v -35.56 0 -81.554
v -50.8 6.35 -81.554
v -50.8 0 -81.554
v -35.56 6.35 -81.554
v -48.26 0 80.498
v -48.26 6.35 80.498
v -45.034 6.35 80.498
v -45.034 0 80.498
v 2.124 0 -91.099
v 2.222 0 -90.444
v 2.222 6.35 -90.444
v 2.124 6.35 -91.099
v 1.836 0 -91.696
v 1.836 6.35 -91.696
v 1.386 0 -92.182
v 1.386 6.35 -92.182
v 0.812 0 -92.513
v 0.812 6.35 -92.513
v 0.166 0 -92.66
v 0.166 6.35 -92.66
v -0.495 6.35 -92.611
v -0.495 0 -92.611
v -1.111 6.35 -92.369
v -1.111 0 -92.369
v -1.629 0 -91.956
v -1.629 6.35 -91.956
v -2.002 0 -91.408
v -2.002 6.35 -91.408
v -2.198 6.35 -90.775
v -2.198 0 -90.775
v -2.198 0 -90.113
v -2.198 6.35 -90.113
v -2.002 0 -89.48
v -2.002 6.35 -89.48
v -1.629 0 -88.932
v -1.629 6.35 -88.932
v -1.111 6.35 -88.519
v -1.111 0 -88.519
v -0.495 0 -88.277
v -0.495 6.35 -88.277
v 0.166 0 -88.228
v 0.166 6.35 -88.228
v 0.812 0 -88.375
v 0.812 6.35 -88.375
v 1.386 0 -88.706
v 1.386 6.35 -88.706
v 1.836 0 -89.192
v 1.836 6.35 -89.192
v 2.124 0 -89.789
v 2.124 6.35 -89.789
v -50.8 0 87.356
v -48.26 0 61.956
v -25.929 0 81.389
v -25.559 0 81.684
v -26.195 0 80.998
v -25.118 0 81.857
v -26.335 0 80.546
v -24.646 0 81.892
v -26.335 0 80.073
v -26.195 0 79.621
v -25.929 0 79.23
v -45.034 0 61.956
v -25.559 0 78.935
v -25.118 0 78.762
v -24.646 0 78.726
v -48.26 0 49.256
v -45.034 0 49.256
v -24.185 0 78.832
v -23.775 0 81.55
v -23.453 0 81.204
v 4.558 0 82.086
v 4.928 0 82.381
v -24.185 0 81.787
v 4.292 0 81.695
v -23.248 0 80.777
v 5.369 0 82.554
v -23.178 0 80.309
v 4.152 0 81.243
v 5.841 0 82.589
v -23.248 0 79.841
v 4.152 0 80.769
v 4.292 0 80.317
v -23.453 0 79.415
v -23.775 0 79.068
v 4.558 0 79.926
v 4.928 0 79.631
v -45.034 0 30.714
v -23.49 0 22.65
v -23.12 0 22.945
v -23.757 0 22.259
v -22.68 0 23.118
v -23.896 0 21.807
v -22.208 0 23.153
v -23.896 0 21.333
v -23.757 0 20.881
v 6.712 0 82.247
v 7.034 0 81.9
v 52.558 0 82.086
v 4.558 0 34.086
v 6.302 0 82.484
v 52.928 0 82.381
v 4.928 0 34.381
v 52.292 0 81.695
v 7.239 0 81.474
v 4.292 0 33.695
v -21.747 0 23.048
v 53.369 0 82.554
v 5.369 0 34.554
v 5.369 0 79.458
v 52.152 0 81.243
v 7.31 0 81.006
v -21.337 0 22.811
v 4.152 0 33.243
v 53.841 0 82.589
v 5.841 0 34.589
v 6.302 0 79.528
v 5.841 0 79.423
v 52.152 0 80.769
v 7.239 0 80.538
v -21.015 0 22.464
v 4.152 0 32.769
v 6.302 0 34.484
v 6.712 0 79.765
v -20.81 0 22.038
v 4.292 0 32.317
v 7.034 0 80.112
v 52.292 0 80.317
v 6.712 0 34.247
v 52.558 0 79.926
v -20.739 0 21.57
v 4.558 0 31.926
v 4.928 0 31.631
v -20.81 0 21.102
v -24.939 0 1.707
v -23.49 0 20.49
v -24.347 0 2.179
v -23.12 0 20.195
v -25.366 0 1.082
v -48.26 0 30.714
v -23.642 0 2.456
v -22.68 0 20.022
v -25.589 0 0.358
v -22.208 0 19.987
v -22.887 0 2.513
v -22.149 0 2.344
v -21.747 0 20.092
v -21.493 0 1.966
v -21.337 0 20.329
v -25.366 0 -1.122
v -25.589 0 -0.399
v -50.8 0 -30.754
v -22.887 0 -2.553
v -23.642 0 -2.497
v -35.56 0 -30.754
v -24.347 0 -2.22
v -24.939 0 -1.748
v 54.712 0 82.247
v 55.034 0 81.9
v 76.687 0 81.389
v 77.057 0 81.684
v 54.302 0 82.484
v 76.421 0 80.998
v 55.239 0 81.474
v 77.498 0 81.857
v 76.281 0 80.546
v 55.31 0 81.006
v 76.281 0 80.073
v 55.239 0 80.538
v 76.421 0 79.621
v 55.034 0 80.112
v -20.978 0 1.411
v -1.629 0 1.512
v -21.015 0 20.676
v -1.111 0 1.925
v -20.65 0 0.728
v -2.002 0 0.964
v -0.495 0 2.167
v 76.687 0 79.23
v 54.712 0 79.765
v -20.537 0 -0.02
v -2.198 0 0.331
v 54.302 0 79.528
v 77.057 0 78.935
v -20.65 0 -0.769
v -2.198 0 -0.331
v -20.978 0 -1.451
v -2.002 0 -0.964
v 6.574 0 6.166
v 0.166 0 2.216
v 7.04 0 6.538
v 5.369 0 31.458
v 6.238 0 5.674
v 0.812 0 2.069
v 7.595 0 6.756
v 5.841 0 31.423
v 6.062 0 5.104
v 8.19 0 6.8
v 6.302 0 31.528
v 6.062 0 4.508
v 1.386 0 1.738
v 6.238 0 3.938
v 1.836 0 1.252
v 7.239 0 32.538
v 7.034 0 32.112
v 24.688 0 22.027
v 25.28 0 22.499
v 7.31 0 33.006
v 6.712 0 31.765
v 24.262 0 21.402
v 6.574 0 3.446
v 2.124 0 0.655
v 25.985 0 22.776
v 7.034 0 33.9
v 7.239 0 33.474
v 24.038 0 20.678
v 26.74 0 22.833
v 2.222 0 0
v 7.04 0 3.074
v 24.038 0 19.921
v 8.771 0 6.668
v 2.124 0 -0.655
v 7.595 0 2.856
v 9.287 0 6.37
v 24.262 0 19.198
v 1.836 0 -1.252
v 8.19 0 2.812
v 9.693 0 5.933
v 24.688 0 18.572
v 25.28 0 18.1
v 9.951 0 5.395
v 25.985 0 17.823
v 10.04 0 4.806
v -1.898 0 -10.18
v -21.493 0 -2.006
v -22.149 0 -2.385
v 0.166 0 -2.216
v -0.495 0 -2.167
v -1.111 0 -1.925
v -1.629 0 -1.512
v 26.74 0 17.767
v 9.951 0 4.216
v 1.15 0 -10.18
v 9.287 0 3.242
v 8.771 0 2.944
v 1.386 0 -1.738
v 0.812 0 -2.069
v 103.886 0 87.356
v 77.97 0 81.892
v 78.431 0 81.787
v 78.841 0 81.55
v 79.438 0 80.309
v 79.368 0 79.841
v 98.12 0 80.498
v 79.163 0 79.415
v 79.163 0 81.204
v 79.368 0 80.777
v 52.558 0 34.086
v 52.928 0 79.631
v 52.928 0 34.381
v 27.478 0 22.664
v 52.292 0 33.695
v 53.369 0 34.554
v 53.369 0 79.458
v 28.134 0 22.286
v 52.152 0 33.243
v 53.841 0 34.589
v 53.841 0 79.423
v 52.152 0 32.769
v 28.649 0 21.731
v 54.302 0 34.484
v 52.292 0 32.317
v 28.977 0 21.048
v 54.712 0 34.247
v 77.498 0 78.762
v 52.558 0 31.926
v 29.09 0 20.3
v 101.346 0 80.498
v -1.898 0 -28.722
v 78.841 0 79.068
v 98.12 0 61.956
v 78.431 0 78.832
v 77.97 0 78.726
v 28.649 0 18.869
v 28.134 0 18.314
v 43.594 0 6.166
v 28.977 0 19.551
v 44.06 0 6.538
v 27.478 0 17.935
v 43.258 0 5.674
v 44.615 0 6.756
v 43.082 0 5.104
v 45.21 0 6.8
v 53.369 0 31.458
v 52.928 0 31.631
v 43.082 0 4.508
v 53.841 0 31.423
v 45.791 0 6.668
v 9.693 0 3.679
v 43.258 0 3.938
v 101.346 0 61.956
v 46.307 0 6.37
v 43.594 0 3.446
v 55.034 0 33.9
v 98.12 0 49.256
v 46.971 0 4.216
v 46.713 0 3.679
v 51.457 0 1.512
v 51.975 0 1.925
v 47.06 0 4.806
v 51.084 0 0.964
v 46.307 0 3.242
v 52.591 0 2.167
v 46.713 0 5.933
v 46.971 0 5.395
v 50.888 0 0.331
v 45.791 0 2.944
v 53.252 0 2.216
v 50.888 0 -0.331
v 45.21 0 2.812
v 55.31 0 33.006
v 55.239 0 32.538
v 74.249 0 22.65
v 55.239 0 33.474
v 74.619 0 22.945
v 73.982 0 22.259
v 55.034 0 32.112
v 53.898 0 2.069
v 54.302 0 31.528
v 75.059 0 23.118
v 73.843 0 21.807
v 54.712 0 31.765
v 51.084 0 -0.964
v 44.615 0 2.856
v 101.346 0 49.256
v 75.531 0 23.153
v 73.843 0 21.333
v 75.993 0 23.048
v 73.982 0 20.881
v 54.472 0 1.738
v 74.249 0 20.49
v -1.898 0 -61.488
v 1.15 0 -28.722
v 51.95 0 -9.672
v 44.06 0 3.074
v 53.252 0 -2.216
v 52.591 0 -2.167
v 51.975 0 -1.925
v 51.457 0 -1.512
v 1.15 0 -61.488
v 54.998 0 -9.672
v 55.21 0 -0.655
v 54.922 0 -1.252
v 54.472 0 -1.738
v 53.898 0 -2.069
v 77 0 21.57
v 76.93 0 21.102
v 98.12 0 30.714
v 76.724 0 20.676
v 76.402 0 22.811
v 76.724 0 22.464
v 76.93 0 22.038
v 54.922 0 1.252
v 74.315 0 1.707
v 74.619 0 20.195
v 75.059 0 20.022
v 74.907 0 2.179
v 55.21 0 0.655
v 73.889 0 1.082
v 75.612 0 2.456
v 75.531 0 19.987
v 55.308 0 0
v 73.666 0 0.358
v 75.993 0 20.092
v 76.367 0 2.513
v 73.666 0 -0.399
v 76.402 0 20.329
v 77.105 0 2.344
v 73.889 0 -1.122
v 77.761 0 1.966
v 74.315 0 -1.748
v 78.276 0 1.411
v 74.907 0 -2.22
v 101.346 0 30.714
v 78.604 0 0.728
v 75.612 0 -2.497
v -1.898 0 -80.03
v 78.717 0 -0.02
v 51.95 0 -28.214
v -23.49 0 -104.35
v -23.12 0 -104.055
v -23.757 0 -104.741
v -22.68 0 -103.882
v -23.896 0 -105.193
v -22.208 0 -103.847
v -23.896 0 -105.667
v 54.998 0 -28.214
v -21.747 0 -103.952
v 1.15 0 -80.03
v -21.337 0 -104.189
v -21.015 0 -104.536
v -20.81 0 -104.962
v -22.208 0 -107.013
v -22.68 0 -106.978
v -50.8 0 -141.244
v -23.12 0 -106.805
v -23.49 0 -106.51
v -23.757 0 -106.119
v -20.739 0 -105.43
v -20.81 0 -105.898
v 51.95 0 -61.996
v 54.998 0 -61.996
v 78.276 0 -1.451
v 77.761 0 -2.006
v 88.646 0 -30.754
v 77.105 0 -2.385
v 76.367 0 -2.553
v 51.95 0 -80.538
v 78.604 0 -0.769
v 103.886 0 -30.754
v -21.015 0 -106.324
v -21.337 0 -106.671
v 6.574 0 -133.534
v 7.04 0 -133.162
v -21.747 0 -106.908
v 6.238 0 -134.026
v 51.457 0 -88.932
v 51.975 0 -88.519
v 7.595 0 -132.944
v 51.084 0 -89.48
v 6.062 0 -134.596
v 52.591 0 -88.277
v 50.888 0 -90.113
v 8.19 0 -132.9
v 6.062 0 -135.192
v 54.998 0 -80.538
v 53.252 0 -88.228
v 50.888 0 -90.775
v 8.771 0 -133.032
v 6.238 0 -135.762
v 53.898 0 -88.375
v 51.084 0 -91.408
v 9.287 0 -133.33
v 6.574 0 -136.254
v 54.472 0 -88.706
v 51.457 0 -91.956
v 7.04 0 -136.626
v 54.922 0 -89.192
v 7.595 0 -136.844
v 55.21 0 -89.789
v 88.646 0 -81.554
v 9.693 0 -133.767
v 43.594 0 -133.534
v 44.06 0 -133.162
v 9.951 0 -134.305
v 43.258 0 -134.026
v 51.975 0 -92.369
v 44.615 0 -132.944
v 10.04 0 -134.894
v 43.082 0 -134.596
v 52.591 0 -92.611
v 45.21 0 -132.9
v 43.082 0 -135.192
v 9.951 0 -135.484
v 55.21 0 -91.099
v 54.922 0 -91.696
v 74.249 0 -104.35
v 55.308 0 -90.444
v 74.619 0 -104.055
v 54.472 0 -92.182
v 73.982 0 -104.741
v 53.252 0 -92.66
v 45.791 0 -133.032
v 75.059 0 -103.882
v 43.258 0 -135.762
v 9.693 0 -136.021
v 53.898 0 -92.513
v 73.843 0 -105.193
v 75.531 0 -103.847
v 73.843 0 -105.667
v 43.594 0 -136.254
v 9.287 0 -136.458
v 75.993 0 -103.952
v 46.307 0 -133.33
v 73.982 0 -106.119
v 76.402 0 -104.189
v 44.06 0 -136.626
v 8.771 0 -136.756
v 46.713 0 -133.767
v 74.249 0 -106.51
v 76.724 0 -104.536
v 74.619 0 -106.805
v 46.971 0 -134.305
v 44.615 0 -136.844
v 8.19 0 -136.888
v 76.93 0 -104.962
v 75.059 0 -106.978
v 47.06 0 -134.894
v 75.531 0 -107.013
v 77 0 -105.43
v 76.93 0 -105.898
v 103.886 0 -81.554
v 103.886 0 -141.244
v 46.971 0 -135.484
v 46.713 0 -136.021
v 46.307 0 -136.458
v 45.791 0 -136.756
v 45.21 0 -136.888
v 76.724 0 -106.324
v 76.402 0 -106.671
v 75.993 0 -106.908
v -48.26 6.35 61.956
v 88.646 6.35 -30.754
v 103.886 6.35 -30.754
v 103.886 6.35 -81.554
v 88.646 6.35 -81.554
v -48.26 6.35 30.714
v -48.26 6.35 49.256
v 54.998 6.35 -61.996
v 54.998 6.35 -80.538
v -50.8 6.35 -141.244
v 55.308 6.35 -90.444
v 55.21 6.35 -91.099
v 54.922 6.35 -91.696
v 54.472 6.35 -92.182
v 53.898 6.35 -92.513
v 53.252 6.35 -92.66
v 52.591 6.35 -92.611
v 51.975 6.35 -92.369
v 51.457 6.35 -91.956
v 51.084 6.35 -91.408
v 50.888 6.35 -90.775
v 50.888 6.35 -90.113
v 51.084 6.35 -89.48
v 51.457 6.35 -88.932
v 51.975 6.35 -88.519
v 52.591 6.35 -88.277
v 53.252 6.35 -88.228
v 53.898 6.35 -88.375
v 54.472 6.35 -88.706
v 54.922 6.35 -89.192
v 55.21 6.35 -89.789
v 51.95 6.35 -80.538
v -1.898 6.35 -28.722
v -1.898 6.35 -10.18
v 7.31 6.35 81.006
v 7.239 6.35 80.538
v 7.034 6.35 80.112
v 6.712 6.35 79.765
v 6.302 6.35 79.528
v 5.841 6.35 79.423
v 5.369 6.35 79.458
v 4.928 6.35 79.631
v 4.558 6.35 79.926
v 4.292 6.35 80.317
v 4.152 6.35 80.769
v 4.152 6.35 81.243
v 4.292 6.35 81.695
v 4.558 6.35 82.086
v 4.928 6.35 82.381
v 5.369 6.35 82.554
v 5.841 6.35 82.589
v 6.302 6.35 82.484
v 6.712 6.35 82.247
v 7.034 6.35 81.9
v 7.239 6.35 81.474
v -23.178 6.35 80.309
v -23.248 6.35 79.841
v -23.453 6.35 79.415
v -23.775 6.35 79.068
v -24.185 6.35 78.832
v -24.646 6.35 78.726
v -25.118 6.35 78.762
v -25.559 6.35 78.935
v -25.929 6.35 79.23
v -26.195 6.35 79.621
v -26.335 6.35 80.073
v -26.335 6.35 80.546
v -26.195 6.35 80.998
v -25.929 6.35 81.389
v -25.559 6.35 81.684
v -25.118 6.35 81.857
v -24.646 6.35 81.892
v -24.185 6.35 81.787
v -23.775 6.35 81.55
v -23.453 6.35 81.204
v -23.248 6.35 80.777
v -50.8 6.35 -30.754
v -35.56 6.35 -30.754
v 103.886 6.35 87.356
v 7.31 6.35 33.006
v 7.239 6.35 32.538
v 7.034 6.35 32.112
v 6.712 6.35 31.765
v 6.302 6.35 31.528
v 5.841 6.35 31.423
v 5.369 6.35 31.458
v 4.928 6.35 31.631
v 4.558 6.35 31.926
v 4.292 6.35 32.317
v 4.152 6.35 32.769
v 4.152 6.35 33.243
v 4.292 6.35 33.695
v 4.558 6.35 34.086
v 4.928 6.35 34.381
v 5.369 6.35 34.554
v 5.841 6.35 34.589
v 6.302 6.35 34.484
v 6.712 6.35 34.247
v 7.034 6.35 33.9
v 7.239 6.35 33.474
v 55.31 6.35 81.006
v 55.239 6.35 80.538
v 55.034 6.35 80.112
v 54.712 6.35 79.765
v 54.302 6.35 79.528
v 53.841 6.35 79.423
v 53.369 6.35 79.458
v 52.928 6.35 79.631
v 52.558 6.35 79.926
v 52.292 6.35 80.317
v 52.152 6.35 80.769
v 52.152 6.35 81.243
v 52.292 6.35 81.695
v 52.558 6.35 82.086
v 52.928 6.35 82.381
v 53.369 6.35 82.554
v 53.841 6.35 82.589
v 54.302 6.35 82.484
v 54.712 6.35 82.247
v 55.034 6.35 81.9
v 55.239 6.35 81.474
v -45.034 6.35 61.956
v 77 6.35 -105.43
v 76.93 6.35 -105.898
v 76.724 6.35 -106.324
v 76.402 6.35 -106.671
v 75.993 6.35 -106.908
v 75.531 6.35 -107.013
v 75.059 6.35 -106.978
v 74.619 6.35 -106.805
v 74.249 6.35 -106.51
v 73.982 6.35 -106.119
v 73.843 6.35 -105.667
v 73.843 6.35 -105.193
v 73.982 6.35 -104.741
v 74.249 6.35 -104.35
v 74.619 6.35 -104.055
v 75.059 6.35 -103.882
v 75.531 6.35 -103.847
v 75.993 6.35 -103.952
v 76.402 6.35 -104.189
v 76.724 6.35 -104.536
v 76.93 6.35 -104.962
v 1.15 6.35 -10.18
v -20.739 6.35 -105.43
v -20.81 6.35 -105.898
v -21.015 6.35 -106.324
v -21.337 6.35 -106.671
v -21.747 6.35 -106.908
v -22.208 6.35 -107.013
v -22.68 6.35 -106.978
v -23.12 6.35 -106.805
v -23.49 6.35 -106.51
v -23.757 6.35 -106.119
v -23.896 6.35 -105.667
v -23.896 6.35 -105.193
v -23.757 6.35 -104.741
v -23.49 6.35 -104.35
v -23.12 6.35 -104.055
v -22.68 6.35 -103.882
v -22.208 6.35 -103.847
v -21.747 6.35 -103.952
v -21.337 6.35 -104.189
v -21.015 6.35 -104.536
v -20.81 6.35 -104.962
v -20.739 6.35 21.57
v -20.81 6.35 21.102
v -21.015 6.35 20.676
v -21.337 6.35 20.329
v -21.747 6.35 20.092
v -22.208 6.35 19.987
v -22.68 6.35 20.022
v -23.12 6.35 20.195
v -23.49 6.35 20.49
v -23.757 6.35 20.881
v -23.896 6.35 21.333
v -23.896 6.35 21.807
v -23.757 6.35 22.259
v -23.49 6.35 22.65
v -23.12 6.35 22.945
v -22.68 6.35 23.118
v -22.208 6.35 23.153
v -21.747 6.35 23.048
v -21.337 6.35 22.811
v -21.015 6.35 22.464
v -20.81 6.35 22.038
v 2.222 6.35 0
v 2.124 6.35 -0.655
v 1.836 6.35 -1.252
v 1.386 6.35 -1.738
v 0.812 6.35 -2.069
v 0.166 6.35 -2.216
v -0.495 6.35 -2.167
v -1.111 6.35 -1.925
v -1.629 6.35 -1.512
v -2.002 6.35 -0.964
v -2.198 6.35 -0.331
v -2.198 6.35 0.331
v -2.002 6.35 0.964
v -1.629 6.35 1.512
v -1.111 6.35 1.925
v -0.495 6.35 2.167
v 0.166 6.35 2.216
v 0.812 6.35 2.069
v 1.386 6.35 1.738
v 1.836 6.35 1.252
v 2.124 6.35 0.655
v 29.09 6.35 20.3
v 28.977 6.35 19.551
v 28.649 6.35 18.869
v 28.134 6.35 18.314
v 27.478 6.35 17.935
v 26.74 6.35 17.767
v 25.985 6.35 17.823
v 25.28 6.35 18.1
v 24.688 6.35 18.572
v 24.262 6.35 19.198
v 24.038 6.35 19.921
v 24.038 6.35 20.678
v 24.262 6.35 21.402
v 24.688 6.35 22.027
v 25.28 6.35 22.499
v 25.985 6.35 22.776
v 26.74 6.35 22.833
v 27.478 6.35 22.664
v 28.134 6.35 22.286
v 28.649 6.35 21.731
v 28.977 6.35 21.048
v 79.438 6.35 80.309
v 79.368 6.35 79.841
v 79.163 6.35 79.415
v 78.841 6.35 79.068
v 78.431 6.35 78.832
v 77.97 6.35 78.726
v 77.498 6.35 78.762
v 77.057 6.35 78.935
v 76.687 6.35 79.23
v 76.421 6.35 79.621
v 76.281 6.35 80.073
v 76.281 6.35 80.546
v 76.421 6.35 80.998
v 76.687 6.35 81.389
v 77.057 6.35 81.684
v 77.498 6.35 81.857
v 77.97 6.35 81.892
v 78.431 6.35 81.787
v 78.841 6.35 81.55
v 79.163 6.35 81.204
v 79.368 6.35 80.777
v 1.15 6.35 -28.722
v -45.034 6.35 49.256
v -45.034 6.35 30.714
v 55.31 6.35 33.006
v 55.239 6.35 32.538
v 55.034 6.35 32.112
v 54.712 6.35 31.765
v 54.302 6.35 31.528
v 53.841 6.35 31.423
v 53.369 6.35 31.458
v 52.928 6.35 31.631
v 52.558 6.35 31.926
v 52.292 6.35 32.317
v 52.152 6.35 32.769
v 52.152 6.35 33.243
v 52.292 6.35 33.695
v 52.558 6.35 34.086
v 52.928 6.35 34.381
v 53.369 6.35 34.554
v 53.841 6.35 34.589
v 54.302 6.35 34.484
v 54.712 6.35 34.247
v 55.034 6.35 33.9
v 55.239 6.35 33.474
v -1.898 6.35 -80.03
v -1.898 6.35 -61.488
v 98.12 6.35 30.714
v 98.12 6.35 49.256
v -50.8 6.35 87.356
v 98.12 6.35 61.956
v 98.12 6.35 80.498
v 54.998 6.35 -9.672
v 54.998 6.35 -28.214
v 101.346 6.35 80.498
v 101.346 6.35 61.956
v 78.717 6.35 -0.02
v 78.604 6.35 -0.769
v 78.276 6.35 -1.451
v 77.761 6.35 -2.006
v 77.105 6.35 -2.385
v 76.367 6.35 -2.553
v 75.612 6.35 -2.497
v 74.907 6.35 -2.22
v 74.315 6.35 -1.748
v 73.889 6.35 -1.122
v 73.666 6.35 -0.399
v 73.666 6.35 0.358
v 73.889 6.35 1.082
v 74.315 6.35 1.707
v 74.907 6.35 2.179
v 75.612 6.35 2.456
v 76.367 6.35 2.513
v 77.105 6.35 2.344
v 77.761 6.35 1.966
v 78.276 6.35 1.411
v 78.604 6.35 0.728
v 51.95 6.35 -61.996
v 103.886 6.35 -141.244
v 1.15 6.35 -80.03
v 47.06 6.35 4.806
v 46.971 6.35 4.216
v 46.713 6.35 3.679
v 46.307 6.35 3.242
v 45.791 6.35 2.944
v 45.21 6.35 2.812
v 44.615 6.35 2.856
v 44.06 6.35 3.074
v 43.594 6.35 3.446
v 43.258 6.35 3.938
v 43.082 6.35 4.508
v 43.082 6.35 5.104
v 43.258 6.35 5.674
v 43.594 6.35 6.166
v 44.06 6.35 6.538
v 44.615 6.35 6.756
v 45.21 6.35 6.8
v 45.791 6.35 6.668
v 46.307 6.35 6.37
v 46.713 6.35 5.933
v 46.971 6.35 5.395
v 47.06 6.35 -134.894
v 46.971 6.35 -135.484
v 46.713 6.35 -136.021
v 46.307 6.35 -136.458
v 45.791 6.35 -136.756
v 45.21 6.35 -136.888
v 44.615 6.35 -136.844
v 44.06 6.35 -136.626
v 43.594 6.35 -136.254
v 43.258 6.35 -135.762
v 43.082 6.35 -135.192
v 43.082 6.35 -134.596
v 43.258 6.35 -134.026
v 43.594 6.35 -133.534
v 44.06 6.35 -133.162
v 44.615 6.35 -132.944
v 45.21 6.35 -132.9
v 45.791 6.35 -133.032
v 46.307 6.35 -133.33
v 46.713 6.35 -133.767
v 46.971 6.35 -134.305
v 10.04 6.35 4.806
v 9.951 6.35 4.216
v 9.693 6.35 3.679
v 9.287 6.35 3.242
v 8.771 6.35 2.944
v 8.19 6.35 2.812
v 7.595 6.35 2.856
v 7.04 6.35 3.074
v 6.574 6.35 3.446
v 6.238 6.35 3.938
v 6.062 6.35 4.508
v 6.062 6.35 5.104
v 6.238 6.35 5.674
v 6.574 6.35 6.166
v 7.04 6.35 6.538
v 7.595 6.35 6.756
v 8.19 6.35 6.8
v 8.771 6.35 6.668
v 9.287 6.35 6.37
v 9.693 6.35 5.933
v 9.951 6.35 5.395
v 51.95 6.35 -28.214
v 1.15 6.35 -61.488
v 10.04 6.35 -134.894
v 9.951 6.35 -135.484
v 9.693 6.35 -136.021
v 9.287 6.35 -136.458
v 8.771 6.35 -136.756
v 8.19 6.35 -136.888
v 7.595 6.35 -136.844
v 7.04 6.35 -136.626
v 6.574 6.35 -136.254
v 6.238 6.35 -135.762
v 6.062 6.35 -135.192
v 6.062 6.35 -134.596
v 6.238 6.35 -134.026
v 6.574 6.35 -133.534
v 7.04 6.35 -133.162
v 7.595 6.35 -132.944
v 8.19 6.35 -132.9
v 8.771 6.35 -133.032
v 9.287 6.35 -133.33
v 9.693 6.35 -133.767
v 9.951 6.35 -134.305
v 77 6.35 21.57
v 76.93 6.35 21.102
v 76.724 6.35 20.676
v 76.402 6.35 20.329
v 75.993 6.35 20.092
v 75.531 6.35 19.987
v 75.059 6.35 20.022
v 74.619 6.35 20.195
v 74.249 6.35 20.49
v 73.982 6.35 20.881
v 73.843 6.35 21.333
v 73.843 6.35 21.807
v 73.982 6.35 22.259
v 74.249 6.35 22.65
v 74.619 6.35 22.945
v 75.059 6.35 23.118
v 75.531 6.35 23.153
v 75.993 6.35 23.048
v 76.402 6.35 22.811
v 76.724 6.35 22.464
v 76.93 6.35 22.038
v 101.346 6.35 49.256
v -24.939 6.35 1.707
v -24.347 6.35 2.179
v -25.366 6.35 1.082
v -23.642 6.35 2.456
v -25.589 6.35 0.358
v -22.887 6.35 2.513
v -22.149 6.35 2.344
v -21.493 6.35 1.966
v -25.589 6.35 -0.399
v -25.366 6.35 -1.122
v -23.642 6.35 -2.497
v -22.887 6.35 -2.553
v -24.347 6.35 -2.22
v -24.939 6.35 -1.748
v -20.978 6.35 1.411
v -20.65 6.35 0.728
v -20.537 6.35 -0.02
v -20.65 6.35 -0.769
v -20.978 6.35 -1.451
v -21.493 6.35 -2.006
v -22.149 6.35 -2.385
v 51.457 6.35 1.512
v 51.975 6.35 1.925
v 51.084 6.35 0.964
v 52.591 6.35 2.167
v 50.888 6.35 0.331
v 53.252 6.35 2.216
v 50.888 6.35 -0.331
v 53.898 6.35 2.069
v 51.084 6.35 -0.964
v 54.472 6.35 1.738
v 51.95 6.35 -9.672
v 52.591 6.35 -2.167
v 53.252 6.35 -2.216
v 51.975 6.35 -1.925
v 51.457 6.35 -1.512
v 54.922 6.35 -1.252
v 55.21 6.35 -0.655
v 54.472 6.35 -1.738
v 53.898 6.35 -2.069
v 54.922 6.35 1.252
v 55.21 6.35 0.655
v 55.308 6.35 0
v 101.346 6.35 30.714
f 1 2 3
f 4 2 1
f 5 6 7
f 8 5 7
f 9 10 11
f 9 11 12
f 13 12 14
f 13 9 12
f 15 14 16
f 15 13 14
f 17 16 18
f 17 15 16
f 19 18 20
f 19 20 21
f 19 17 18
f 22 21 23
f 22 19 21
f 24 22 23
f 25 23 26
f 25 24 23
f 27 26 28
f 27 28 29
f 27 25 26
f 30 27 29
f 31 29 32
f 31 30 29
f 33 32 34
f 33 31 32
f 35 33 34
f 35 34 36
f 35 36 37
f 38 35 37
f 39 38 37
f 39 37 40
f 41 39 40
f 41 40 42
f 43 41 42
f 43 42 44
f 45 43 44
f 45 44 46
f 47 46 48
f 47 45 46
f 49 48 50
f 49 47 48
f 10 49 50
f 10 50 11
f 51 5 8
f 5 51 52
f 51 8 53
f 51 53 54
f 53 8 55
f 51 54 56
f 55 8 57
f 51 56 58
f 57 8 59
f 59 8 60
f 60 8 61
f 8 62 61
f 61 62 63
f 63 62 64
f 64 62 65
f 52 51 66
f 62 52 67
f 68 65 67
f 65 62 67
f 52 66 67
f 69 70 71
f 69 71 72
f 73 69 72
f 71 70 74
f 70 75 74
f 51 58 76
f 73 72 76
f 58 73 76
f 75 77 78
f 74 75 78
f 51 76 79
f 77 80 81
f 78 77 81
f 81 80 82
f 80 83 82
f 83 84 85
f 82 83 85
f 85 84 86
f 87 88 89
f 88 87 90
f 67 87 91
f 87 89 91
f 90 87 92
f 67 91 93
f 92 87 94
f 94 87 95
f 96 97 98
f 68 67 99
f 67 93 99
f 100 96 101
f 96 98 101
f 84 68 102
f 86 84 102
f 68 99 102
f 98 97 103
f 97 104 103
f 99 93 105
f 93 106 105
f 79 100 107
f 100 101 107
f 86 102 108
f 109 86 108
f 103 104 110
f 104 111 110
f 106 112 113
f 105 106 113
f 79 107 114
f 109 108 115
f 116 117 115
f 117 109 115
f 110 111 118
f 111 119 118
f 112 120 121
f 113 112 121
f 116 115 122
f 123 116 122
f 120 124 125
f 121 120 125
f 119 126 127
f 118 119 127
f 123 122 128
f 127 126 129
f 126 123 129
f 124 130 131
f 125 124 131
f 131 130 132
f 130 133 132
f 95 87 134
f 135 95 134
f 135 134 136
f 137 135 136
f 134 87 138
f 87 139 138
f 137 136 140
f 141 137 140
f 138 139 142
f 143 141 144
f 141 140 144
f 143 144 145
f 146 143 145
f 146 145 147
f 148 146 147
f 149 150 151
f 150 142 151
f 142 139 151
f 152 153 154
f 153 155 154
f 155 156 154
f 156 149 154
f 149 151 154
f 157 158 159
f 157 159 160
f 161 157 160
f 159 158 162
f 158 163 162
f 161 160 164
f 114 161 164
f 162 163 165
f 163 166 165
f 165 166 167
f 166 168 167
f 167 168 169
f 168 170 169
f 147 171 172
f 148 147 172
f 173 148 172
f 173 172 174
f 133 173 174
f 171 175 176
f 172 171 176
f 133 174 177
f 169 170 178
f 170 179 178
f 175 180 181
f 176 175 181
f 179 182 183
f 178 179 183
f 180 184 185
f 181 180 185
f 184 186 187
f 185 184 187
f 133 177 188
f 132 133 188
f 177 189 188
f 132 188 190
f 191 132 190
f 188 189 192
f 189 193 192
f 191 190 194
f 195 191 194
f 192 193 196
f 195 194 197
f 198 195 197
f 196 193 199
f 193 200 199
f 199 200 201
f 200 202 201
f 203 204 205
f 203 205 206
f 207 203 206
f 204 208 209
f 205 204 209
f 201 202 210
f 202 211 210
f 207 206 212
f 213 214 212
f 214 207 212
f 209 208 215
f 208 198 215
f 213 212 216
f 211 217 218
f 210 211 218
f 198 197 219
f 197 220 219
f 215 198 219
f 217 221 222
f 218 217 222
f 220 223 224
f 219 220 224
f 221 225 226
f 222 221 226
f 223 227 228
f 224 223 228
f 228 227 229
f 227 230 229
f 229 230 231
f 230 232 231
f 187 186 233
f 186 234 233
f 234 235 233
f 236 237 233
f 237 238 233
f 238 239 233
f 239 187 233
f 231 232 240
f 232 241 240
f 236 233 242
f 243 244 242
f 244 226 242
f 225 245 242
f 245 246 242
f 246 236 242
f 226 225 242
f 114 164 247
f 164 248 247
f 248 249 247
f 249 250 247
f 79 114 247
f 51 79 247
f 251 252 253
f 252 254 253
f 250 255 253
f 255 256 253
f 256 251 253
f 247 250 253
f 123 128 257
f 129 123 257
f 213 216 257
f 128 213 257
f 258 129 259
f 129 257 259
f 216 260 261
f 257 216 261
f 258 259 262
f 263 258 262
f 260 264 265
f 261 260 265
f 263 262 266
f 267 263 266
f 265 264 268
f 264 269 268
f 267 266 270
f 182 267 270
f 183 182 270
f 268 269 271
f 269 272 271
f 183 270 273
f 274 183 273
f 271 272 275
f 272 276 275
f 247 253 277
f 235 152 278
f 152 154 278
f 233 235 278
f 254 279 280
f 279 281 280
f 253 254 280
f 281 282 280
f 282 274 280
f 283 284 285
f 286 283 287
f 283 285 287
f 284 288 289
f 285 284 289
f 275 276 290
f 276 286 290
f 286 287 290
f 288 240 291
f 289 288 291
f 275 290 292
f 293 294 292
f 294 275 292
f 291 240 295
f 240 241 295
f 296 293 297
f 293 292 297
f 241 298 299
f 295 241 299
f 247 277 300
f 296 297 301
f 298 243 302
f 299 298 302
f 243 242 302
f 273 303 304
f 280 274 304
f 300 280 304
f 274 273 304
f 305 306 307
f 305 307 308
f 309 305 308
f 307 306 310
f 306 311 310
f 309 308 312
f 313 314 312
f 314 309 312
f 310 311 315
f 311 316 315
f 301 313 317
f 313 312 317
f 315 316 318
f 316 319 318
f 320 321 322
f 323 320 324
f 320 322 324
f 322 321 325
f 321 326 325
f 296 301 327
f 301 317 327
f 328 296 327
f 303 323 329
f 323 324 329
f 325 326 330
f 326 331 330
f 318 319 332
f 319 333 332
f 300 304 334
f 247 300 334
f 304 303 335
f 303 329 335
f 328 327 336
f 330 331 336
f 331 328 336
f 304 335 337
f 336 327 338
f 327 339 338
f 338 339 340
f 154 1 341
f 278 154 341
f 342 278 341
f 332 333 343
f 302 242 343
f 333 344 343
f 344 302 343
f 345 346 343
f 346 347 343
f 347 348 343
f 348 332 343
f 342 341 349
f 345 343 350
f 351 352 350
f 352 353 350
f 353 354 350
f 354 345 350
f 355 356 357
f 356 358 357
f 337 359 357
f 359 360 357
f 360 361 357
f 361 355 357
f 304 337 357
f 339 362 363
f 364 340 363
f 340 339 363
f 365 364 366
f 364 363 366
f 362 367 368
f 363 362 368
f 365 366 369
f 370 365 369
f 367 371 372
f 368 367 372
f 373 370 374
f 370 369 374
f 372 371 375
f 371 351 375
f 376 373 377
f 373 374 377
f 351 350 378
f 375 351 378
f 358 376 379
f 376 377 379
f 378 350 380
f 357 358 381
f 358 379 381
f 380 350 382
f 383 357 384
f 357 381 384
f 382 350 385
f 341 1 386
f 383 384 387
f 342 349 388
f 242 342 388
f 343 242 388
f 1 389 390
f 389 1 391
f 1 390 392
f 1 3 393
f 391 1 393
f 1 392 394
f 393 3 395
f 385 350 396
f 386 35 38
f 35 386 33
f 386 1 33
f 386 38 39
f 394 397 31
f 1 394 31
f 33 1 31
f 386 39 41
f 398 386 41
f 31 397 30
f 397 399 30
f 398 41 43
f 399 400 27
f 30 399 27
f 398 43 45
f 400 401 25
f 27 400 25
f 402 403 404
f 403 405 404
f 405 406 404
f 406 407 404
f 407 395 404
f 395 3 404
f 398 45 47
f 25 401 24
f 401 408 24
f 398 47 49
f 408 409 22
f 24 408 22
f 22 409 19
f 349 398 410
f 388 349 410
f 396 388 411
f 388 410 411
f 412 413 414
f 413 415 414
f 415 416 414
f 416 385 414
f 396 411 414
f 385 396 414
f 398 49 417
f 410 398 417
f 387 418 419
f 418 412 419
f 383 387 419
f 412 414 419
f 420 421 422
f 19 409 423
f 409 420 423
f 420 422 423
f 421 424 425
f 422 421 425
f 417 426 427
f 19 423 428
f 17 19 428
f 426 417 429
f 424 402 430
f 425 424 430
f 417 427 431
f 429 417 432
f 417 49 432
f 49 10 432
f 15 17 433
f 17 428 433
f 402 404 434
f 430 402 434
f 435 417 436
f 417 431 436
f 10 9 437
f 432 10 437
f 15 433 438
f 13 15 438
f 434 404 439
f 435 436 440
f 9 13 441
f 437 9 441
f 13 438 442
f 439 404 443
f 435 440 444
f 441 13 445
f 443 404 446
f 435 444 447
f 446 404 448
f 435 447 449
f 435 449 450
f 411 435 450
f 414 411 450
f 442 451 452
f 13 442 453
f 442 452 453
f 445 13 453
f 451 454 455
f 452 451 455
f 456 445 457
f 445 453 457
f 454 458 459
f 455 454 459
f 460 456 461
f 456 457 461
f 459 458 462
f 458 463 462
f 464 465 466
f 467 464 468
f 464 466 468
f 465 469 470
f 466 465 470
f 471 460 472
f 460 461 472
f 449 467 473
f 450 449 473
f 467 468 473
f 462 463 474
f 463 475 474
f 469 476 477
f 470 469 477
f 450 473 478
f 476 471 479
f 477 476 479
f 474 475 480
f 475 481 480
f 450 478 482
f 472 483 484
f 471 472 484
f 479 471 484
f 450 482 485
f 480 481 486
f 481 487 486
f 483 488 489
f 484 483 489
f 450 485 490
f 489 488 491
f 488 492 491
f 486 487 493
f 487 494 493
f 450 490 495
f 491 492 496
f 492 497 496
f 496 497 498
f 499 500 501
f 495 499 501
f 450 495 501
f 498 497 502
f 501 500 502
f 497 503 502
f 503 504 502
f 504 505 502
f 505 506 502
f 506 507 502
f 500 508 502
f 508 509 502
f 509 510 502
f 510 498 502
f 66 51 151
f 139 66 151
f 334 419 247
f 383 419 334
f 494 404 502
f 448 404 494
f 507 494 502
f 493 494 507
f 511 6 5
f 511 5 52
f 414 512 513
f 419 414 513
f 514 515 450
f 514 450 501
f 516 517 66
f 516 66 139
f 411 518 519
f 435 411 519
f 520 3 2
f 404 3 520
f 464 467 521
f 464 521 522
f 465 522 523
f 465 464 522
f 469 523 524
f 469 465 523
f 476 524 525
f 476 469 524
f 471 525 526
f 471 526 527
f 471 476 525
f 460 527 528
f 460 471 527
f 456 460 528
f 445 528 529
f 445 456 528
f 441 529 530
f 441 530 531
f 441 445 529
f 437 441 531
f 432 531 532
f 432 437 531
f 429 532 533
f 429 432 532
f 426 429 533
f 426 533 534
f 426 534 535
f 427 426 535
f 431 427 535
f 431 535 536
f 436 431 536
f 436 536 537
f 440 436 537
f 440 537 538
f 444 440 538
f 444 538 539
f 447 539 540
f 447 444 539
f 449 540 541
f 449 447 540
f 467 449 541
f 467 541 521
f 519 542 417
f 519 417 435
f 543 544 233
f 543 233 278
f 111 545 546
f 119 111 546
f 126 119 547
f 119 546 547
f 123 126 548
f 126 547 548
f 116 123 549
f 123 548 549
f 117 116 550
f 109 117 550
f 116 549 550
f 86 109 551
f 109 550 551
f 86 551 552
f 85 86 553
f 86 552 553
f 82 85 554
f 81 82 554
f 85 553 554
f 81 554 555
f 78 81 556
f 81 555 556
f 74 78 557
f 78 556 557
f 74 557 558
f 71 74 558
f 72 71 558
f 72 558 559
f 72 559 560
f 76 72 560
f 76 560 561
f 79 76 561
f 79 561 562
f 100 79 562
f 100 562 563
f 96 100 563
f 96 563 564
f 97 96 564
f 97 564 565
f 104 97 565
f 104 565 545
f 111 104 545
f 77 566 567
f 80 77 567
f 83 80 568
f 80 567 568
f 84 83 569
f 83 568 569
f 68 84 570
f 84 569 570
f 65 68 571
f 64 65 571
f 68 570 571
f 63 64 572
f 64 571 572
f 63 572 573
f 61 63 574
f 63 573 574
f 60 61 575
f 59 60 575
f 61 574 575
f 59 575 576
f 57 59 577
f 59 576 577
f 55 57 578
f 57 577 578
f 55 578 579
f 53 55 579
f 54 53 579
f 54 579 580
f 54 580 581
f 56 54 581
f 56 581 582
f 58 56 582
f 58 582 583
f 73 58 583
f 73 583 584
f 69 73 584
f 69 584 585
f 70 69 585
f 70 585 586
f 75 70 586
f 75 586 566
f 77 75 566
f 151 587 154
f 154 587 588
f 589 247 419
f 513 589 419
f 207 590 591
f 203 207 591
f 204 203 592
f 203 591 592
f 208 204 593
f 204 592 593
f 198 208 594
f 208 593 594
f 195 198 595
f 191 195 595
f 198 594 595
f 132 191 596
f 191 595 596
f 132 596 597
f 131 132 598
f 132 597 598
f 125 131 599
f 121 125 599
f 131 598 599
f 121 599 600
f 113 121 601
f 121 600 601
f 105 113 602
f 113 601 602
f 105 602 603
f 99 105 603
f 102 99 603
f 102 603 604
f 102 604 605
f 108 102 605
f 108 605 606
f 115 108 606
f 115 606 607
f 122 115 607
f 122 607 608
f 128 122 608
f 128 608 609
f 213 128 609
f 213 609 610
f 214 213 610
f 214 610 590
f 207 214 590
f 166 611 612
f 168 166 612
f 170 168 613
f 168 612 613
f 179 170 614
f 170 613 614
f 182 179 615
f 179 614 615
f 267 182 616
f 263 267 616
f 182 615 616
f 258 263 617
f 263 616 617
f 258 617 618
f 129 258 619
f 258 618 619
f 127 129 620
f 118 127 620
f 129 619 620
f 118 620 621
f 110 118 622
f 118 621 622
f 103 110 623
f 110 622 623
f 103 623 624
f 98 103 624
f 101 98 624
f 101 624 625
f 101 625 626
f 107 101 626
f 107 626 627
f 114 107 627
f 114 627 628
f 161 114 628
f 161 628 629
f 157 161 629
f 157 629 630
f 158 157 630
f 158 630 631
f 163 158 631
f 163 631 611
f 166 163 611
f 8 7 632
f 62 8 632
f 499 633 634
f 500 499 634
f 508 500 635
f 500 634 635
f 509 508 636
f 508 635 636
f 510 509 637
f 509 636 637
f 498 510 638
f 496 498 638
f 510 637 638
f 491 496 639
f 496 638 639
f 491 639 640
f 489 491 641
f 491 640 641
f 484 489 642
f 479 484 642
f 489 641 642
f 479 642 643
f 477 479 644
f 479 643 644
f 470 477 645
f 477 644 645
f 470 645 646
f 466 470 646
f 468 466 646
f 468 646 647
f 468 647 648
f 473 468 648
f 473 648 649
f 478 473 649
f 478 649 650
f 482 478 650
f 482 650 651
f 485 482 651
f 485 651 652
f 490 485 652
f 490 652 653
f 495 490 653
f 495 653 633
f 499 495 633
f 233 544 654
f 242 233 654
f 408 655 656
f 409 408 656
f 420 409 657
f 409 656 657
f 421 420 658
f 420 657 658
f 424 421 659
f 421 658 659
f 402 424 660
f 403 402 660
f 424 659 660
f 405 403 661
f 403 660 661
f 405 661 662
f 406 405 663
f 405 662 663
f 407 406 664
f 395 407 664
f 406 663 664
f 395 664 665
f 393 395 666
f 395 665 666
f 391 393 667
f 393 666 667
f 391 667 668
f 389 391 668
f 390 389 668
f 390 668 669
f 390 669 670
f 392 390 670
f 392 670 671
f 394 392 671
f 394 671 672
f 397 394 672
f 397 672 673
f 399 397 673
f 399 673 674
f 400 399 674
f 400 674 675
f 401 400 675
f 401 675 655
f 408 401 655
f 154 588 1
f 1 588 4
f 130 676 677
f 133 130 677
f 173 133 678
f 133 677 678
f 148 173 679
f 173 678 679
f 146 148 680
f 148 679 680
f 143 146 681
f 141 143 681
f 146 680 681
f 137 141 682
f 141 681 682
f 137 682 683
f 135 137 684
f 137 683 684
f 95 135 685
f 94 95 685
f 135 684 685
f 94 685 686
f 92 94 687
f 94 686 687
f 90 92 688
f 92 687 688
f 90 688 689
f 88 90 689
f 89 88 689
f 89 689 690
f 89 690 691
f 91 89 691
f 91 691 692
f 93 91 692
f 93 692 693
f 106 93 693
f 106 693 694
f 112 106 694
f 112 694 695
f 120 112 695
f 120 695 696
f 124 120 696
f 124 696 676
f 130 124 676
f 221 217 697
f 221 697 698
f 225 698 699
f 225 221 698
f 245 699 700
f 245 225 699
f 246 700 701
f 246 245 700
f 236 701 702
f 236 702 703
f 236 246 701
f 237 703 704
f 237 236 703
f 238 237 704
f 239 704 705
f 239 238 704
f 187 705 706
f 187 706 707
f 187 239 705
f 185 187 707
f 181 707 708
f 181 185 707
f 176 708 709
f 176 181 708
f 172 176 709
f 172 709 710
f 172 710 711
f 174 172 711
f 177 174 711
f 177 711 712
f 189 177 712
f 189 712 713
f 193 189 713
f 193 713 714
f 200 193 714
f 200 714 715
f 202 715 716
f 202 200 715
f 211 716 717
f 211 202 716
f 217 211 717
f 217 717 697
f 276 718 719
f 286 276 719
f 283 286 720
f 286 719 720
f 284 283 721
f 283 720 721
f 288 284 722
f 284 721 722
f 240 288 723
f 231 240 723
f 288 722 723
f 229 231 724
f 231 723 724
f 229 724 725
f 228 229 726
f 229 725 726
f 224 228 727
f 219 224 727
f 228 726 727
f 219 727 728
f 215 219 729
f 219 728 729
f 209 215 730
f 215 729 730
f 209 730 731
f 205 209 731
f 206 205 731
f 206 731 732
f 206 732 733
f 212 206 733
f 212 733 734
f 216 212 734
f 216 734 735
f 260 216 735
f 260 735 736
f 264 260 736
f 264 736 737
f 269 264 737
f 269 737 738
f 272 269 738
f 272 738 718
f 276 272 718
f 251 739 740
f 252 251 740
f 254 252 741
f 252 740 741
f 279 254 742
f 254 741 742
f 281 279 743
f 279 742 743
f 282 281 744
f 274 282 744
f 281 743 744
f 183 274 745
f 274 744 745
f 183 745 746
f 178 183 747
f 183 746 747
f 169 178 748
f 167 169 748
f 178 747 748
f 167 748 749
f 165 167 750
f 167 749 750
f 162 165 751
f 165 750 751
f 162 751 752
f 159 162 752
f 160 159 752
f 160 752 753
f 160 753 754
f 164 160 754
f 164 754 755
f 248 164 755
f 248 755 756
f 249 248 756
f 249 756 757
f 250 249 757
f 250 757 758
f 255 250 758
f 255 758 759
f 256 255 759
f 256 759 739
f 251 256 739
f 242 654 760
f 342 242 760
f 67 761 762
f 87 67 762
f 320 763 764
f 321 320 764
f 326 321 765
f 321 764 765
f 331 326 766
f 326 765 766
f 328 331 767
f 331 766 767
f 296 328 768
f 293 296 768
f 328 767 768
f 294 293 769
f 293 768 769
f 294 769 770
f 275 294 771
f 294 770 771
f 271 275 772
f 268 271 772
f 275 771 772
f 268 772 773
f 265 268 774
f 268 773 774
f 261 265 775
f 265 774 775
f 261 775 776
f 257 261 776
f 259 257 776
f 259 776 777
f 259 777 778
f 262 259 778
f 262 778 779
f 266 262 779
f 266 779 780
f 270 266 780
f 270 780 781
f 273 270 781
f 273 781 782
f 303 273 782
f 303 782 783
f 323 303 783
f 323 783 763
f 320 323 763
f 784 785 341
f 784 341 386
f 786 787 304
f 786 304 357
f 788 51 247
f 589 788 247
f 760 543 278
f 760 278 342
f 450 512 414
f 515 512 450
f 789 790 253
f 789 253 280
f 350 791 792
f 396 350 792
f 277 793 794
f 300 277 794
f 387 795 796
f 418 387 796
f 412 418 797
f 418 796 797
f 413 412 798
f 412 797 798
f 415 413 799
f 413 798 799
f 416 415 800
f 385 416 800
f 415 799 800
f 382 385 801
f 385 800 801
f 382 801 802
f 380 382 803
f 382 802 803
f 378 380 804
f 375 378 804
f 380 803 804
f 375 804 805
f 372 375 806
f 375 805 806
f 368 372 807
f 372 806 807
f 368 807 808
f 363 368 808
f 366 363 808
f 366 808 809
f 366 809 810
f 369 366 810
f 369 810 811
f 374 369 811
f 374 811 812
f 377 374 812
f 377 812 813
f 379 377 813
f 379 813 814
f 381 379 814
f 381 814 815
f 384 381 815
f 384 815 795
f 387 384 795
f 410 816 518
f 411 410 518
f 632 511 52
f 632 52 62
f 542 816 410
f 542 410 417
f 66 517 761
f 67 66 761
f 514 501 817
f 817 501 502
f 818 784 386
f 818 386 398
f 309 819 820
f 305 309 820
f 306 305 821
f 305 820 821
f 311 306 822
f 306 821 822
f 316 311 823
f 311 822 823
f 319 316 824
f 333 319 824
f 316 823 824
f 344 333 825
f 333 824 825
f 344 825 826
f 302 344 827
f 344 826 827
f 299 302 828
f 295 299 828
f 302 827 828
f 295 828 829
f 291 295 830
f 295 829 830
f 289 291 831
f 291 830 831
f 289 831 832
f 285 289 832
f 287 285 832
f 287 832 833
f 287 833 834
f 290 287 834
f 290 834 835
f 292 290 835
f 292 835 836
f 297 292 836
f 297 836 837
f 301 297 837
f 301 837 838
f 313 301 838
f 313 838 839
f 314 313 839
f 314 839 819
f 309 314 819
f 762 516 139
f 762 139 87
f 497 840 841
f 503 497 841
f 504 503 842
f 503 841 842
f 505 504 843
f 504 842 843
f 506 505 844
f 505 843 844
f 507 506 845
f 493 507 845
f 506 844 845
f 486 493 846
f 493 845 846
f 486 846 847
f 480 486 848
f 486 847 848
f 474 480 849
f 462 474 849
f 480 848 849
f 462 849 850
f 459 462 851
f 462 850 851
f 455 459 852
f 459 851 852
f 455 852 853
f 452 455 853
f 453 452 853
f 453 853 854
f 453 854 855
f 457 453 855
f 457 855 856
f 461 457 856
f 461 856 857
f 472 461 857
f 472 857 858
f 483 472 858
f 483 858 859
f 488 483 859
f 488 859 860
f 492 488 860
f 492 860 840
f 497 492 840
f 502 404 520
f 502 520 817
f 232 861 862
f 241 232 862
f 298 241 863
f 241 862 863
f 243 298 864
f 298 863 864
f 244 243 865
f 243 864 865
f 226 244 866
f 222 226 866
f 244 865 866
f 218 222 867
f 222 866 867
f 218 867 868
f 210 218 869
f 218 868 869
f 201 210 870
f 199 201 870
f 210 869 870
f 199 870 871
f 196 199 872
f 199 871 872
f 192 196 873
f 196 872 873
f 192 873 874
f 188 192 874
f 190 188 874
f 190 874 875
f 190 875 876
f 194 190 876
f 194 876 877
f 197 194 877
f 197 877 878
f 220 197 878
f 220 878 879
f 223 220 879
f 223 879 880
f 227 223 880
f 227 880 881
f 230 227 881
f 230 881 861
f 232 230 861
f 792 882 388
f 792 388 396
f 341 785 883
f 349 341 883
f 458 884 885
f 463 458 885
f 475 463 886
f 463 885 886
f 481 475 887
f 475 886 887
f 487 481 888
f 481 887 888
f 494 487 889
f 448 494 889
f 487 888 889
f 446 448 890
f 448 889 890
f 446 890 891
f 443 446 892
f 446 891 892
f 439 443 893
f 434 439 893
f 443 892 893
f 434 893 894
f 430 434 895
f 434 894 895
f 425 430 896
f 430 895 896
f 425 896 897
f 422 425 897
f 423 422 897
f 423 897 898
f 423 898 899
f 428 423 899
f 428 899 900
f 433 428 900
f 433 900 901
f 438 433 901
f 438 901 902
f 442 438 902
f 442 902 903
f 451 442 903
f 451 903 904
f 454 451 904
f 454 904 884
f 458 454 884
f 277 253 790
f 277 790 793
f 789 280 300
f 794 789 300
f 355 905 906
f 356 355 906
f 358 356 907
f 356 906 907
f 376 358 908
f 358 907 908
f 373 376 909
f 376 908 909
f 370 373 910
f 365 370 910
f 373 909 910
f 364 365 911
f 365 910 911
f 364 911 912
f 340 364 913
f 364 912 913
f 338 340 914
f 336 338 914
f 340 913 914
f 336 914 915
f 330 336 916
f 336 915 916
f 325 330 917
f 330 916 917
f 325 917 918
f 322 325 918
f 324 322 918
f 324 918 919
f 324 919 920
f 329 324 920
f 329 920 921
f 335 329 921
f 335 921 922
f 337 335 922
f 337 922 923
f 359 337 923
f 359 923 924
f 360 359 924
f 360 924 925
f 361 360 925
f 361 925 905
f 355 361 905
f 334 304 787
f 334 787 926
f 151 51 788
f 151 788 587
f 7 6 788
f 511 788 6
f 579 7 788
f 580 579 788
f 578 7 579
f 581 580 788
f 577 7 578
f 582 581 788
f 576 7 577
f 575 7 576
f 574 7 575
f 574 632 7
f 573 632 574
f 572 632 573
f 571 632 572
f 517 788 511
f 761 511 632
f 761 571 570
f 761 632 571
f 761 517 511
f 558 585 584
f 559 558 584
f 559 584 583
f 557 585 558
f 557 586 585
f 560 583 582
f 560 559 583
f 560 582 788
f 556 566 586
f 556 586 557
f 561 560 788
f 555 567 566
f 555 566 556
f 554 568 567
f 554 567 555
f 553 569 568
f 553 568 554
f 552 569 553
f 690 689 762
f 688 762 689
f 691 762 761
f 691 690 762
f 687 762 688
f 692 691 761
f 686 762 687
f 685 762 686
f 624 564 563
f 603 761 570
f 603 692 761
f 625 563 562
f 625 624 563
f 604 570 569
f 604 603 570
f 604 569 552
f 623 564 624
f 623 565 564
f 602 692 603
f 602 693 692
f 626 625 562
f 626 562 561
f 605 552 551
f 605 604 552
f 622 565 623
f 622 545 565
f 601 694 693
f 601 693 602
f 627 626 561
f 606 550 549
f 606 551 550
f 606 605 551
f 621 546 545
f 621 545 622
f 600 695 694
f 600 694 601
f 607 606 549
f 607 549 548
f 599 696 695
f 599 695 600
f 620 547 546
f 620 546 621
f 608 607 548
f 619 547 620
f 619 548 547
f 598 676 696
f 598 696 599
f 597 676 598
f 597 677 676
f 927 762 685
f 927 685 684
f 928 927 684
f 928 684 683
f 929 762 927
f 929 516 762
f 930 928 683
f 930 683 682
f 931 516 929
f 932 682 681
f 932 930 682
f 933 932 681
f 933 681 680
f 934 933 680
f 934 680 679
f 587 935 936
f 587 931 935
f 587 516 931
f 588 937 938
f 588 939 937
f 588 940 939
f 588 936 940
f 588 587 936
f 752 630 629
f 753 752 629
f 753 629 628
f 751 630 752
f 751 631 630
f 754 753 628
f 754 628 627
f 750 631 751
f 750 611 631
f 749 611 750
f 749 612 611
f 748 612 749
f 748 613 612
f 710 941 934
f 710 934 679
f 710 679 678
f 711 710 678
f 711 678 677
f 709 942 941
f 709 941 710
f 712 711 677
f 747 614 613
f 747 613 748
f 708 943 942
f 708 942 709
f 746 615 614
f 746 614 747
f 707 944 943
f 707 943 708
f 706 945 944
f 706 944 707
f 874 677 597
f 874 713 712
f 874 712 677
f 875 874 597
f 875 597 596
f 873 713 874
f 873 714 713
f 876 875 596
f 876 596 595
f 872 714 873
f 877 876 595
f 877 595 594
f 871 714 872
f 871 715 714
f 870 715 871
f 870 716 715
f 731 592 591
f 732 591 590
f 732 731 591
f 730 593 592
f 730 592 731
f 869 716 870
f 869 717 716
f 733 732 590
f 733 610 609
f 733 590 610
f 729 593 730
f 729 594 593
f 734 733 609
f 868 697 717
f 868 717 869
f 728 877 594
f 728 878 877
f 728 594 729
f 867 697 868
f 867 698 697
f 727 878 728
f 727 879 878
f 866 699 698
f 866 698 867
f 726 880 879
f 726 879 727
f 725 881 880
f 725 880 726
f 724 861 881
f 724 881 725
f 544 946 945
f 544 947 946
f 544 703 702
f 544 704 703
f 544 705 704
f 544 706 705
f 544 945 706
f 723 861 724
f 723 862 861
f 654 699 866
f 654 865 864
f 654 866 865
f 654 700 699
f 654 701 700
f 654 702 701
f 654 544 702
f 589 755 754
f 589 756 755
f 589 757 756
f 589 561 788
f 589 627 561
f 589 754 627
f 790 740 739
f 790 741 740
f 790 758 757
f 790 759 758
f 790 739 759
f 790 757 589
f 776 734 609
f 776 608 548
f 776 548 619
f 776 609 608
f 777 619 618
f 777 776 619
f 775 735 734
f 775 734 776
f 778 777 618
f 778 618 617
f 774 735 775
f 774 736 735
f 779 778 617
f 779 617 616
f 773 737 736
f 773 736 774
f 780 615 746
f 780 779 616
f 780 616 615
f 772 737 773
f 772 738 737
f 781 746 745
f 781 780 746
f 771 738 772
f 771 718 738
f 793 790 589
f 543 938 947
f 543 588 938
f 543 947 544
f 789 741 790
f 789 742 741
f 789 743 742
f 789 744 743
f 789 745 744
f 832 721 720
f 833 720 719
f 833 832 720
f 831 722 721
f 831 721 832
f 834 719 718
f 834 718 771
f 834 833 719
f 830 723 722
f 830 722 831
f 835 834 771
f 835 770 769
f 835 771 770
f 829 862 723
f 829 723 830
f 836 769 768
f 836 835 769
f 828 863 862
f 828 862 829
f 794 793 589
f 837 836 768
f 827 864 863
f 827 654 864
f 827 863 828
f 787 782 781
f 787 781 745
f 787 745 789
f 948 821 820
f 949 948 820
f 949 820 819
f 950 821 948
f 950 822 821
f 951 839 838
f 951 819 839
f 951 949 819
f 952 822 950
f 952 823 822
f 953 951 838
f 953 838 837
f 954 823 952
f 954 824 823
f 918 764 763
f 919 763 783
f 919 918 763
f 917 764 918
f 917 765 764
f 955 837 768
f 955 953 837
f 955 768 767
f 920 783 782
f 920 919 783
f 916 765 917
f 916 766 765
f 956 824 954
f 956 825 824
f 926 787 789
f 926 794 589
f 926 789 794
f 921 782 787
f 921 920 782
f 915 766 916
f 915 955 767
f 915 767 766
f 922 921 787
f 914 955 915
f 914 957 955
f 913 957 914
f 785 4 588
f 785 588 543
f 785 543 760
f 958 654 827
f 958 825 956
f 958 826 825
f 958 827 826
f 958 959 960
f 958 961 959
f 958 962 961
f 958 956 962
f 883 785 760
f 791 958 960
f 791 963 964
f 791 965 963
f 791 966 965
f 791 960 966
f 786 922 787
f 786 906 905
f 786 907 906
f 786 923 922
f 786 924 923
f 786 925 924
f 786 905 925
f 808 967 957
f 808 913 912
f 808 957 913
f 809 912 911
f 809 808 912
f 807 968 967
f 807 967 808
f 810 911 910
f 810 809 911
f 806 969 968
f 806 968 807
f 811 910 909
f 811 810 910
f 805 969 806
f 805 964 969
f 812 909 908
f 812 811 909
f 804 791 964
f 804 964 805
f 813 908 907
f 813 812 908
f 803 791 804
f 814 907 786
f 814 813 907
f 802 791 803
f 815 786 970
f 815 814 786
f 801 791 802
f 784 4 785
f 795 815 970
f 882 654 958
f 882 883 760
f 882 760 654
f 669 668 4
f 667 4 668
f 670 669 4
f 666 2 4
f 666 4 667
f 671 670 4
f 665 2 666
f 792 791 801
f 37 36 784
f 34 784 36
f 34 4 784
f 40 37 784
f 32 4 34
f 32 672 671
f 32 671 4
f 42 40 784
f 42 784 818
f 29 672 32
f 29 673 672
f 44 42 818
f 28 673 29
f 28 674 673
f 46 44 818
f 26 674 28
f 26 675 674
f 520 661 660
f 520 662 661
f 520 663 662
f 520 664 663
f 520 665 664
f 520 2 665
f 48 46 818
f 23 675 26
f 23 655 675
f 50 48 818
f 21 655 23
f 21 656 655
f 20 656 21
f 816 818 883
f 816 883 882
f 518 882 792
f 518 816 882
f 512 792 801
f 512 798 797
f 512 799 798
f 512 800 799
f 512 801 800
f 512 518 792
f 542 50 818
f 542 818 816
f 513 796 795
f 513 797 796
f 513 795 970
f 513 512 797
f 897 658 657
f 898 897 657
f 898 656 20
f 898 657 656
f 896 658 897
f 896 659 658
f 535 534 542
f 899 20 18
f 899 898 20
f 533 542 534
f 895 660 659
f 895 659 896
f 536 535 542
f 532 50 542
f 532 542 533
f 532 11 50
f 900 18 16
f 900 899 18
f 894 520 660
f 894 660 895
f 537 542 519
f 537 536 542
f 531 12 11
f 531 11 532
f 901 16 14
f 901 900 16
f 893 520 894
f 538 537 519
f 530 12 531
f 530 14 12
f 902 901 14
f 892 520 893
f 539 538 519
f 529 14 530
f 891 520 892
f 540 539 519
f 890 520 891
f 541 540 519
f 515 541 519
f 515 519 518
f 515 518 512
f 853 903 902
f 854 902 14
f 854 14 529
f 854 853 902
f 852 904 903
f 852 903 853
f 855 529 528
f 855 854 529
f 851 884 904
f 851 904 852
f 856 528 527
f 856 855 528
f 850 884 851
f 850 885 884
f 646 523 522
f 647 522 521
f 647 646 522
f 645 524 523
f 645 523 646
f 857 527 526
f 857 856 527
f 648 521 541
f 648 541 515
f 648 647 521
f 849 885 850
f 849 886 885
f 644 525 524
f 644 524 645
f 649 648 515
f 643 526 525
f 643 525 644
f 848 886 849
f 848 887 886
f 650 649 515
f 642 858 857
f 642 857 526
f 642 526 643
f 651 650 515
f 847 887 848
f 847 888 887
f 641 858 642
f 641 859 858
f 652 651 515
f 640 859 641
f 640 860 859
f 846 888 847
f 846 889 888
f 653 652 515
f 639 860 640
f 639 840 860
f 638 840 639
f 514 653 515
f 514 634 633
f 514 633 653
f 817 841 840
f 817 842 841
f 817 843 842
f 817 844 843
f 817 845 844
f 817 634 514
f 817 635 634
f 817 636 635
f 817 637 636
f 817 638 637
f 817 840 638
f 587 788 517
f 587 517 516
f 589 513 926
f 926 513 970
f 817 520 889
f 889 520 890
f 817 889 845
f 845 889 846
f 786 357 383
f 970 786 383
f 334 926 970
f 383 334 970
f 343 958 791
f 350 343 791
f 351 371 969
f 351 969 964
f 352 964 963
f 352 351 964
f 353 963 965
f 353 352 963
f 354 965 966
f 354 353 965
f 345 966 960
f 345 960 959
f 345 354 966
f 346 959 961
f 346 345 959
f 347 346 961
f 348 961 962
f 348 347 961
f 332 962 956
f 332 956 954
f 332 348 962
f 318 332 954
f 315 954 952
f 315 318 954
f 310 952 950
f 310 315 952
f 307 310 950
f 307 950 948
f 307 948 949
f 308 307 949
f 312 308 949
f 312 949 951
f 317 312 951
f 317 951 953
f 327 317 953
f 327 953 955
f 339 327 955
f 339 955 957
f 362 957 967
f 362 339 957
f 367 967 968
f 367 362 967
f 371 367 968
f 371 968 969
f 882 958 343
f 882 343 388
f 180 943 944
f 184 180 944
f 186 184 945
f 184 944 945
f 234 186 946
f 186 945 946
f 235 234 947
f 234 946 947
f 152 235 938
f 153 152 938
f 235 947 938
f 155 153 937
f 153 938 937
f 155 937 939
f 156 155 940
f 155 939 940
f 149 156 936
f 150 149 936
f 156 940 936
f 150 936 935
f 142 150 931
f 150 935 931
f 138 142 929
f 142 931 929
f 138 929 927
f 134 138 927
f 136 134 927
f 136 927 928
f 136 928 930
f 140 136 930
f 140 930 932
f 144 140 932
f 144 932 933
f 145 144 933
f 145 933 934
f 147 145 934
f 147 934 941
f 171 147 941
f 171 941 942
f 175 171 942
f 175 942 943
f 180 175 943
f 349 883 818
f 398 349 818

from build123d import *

# Parameters (mm, degrees)
SKETCH2_W           = 154.686
SKETCH2_H           = 228.6
BOSS_EXTRUDE1_DEPTH = 6.35
SKETCH1_R           = 2.2225
CUT_EXTRUDE1_DEPTH  = 6.35
SKETCH3_W           = 15.24
SKETCH3_H           = 50.8
CUT_EXTRUDE2_DEPTH  = 6.35
SKETCH8_R           = 2.54
CUT_EXTRUDE3_DEPTH  = 17.78
SKETCH9_R           = 1.5875
CUT_EXTRUDE4_DEPTH  = 17.78
SKETCH10_R          = 1.5875
CUT_EXTRUDE5_DEPTH  = 10.16
SKETCH12_W          = 3.048
SKETCH12_H          = 18.542
CUT_EXTRUDE7_DEPTH  = 8.255
SKETCH13_W          = 3.2258
SKETCH13_H          = 18.542
CUT_EXTRUDE8_DEPTH  = 7.35
SKETCH14_R          = 1.5875
CUT_EXTRUDE9_DEPTH  = 7.35
SKETCH16_R          = 2
CUT_EXTRUDE11_DEPTH = 7.35


with BuildPart() as part:
    # Sketch2 → Boss-Extrude1 (new body)
    with BuildSketch(Plane(origin=(0, 0, 0), x_dir=(1, 0, 0), z_dir=(0, 1, 0))):
        with Locations((26.543, 26.944051327)):
            Rectangle(SKETCH2_W, SKETCH2_H)
    extrude(amount=BOSS_EXTRUDE1_DEPTH)

    # Sketch1 → Cut-Extrude1 (cut)
    with BuildSketch(Plane(origin=(0, 0, 0), x_dir=(1, 0, 0), z_dir=(0, 1, 0))):
        with Locations((0, 90.444051327)):
            Circle(SKETCH1_R)
        with Locations((53.086, 90.444051327)):
            Circle(SKETCH1_R)
        Circle(SKETCH1_R)
        with Locations((53.086, 0)):
            Circle(SKETCH1_R)
    extrude(amount=CUT_EXTRUDE1_DEPTH, mode=Mode.SUBTRACT)

    # Sketch3 → Cut-Extrude2 (cut)
    with BuildSketch(Plane(origin=(0, 6.35, 0), x_dir=(1, 0, 0), z_dir=(0, 1, 0))):
        with Locations((96.266, 56.154051327)):
            Rectangle(SKETCH3_W, SKETCH3_H)
        with Locations((-43.18, 56.154051327)):
            Rectangle(SKETCH3_W, SKETCH3_H)
    extrude(amount=-CUT_EXTRUDE2_DEPTH, mode=Mode.SUBTRACT)

    # Sketch8 → Cut-Extrude3 (cut)
    with BuildSketch(Plane(origin=(0, 6.35, 0), x_dir=(1, 0, 0), z_dir=(0, 1, 0))):
        with Locations((26.550112, -20.29968)):
            Circle(SKETCH8_R)
        with Locations((-23.077082804, 0.02032)):
            Circle(SKETCH8_R)
        with Locations((76.177306804, 0.02032)):
            Circle(SKETCH8_R)
    extrude(amount=-CUT_EXTRUDE3_DEPTH, mode=Mode.SUBTRACT)

    # Sketch9 → Cut-Extrude4 (cut)
    with BuildSketch(Plane(origin=(0, 6.35, 0), x_dir=(1, 0, 0), z_dir=(0, 1, 0))):
        with Locations((53.722112, -33.005948673)):
            Circle(SKETCH9_R)
        with Locations((5.722112, -33.005948673)):
            Circle(SKETCH9_R)
        with Locations((53.722112, -81.005948673)):
            Circle(SKETCH9_R)
        with Locations((5.722112, -81.005948673)):
            Circle(SKETCH9_R)
    extrude(amount=-CUT_EXTRUDE4_DEPTH, mode=Mode.SUBTRACT)

    # Sketch10 → Cut-Extrude5 (cut)
    with BuildSketch(Plane(origin=(0, 6.35, 0), x_dir=(1, 0, 0), z_dir=(0, 1, 0))):
        with Locations((-22.3266, 105.430051327)):
            Circle(SKETCH10_R)
        with Locations((-22.3266, -21.569948673)):
            Circle(SKETCH10_R)
        with Locations((75.4126, 105.430051327)):
            Circle(SKETCH10_R)
        with Locations((75.4126, -21.569948673)):
            Circle(SKETCH10_R)
    extrude(amount=-CUT_EXTRUDE5_DEPTH, mode=Mode.SUBTRACT)

    # Sketch12 → Cut-Extrude7 (cut)
    with BuildSketch(Plane(origin=(0, 6.35, 0), x_dir=(1, 0, 0), z_dir=(0, 1, 0))):
        with Locations((-0.373888, 19.451051327)):
            Rectangle(SKETCH12_W, SKETCH12_H)
        with Locations((-0.373888, 70.759051327)):
            Rectangle(SKETCH12_W, SKETCH12_H)
        with Locations((53.474112, 71.267051327)):
            Rectangle(SKETCH12_W, SKETCH12_H)
        with Locations((53.474112, 18.943051327)):
            Rectangle(SKETCH12_W, SKETCH12_H)
    extrude(amount=-CUT_EXTRUDE7_DEPTH, mode=Mode.SUBTRACT)

    # Sketch13 → Cut-Extrude8 (cut, through all)
    with BuildSketch(Plane(origin=(0, 6.35, 0), x_dir=(1, 0, 0), z_dir=(0, 1, 0))):
        with Locations((-46.6471, -39.984948673)):
            Rectangle(SKETCH13_W, SKETCH13_H)
        with Locations((-46.6471, -71.226948673)):
            Rectangle(SKETCH13_W, SKETCH13_H)
        with Locations((99.7331, -71.226948673)):
            Rectangle(SKETCH13_W, SKETCH13_H)
        with Locations((99.7331, -39.984948673)):
            Rectangle(SKETCH13_W, SKETCH13_H)
    extrude(amount=-CUT_EXTRUDE8_DEPTH, mode=Mode.SUBTRACT)

    # Sketch14 → Cut-Extrude9 (cut, through all)
    with BuildSketch(Plane(origin=(0, 6.35, 0), x_dir=(1, 0, 0), z_dir=(0, 1, 0))):
        with Locations((-24.765, -80.309322307)):
            Circle(SKETCH14_R)
        with Locations((77.851, -80.309322307)):
            Circle(SKETCH14_R)
    extrude(amount=-CUT_EXTRUDE9_DEPTH, mode=Mode.SUBTRACT)

    # Sketch16 → Cut-Extrude11 (cut, through all)
    with BuildSketch(Plane(origin=(0, 6.35, 0), x_dir=(1, 0, 0), z_dir=(0, 1, 0))):
        with Locations((45.060116, 134.894051327)):
            Circle(SKETCH16_R)
        with Locations((8.040116, 134.894051327)):
            Circle(SKETCH16_R)
        with Locations((8.040116, -4.805948673)):
            Circle(SKETCH16_R)
        with Locations((45.060116, -4.805948673)):
            Circle(SKETCH16_R)
    extrude(amount=-CUT_EXTRUDE11_DEPTH, mode=Mode.SUBTRACT)


solid = part.part
